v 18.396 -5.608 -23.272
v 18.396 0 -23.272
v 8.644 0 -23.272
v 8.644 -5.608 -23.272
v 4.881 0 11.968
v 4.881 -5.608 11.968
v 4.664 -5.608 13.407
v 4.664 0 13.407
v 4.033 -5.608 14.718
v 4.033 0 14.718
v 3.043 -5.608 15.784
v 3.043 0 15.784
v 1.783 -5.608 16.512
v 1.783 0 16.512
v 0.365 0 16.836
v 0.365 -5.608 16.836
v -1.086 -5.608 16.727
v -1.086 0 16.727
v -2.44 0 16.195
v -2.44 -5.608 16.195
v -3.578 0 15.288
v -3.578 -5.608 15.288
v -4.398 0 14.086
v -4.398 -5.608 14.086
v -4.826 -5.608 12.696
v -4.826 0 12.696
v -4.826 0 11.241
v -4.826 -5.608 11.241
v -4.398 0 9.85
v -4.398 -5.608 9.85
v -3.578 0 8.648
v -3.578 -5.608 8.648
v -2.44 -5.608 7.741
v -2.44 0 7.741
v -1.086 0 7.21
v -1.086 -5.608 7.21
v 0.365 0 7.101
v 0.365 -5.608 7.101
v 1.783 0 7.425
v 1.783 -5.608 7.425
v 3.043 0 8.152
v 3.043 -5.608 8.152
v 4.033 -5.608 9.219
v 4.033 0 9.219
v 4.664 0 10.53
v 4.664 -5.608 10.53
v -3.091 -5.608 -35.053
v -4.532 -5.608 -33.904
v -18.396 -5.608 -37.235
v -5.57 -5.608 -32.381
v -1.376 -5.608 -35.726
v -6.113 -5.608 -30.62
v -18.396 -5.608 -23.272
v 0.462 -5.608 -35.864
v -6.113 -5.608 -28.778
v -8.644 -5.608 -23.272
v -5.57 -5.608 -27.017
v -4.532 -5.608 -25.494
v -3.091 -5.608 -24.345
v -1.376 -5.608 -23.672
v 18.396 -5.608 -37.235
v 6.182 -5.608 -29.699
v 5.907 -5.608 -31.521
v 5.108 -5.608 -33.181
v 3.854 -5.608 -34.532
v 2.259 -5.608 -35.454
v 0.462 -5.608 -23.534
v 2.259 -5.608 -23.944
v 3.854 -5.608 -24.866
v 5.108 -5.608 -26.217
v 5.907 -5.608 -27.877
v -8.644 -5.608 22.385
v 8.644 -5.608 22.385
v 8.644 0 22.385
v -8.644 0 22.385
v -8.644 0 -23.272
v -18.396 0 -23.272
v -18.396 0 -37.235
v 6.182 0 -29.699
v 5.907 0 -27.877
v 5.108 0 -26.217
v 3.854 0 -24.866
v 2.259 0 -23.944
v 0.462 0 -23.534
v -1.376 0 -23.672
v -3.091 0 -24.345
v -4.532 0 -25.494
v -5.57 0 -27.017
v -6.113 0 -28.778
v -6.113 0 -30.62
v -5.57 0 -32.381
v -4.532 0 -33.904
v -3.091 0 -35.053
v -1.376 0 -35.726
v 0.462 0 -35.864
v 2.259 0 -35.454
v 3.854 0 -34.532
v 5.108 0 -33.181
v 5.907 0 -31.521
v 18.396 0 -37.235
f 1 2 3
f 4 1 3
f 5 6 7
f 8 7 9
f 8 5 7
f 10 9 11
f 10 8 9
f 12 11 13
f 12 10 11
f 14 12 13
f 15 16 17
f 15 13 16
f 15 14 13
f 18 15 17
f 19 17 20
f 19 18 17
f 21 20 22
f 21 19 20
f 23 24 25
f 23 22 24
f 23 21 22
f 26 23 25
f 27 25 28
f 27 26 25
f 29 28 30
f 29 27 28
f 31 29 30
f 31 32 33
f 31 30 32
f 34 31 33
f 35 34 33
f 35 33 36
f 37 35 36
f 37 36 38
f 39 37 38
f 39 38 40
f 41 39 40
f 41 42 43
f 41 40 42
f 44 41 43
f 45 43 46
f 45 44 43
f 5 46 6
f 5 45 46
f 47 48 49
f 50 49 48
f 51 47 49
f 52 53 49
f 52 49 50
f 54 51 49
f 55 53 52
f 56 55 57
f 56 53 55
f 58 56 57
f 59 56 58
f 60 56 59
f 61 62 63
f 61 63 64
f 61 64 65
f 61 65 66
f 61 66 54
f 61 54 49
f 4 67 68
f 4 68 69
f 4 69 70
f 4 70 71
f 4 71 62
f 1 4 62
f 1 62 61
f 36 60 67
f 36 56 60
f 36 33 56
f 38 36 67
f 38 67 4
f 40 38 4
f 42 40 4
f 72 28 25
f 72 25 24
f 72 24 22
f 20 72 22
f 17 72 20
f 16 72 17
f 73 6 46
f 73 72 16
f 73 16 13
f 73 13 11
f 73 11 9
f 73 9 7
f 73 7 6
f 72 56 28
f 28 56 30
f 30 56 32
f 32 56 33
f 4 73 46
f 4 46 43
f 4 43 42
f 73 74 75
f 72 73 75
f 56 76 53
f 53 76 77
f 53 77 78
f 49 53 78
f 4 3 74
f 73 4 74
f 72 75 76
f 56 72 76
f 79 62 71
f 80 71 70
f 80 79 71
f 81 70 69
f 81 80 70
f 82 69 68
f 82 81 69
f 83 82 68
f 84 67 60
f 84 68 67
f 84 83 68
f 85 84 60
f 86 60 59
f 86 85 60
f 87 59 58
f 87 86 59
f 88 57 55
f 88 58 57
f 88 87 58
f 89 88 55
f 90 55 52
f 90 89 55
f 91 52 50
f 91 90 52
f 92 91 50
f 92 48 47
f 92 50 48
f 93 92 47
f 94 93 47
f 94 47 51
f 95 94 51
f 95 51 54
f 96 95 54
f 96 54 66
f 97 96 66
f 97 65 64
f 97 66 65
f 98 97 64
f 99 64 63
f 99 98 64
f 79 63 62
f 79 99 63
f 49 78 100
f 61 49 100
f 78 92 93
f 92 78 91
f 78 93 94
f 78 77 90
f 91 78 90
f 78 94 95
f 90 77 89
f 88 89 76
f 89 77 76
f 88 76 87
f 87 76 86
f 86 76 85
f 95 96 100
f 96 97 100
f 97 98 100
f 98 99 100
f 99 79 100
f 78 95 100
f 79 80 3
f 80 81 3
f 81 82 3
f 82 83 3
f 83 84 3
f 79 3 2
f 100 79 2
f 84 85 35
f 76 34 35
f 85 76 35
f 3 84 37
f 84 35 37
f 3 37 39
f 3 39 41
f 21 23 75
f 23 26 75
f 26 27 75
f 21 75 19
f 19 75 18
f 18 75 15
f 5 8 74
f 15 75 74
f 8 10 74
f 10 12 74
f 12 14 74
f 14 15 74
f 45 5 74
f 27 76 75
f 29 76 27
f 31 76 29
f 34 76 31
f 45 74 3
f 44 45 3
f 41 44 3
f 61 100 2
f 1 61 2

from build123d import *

# Parameters (mm, degrees)
F2_R     = 4.88099
F3_DEPTH = 5.6077
F4_DEPTH = 25.4
F1_R     = 6.18197
F5_DEPTH = 25.4


with BuildPart() as f3:
    # F2 (on face) → F3 (new body)
    with BuildSketch(Plane.XZ):
        Polygon((8.64374, 22.38507), (0, 22.38507), (-8.64374, 22.38507), (-8.64374, -23.271605), (-18.395651, -23.271605), (-18.395651, -37.234571), (0, -37.234571), (18.395651, -37.234571), (18.395651, -23.271605), (8.64374, -23.271605), align=None)
        with Locations((0, 11.968255)):
            Circle(F2_R, mode=Mode.SUBTRACT)
        with Locations((0, 11.968255)):
            Circle(F2_R)
    extrude(amount=F3_DEPTH)

    # F2 (on face) → F4 (cut)
    with BuildSketch(Plane.XZ):
        with Locations((0, 11.968255)):
            Circle(F2_R)
    extrude(amount=F4_DEPTH, mode=Mode.SUBTRACT)

    # F1 (on face) → F5 (cut)
    with BuildSketch(Plane.XZ):
        with Locations((0, -29.699003)):
            Circle(F1_R)
    extrude(amount=F5_DEPTH, mode=Mode.SUBTRACT)


solid = f3.part
